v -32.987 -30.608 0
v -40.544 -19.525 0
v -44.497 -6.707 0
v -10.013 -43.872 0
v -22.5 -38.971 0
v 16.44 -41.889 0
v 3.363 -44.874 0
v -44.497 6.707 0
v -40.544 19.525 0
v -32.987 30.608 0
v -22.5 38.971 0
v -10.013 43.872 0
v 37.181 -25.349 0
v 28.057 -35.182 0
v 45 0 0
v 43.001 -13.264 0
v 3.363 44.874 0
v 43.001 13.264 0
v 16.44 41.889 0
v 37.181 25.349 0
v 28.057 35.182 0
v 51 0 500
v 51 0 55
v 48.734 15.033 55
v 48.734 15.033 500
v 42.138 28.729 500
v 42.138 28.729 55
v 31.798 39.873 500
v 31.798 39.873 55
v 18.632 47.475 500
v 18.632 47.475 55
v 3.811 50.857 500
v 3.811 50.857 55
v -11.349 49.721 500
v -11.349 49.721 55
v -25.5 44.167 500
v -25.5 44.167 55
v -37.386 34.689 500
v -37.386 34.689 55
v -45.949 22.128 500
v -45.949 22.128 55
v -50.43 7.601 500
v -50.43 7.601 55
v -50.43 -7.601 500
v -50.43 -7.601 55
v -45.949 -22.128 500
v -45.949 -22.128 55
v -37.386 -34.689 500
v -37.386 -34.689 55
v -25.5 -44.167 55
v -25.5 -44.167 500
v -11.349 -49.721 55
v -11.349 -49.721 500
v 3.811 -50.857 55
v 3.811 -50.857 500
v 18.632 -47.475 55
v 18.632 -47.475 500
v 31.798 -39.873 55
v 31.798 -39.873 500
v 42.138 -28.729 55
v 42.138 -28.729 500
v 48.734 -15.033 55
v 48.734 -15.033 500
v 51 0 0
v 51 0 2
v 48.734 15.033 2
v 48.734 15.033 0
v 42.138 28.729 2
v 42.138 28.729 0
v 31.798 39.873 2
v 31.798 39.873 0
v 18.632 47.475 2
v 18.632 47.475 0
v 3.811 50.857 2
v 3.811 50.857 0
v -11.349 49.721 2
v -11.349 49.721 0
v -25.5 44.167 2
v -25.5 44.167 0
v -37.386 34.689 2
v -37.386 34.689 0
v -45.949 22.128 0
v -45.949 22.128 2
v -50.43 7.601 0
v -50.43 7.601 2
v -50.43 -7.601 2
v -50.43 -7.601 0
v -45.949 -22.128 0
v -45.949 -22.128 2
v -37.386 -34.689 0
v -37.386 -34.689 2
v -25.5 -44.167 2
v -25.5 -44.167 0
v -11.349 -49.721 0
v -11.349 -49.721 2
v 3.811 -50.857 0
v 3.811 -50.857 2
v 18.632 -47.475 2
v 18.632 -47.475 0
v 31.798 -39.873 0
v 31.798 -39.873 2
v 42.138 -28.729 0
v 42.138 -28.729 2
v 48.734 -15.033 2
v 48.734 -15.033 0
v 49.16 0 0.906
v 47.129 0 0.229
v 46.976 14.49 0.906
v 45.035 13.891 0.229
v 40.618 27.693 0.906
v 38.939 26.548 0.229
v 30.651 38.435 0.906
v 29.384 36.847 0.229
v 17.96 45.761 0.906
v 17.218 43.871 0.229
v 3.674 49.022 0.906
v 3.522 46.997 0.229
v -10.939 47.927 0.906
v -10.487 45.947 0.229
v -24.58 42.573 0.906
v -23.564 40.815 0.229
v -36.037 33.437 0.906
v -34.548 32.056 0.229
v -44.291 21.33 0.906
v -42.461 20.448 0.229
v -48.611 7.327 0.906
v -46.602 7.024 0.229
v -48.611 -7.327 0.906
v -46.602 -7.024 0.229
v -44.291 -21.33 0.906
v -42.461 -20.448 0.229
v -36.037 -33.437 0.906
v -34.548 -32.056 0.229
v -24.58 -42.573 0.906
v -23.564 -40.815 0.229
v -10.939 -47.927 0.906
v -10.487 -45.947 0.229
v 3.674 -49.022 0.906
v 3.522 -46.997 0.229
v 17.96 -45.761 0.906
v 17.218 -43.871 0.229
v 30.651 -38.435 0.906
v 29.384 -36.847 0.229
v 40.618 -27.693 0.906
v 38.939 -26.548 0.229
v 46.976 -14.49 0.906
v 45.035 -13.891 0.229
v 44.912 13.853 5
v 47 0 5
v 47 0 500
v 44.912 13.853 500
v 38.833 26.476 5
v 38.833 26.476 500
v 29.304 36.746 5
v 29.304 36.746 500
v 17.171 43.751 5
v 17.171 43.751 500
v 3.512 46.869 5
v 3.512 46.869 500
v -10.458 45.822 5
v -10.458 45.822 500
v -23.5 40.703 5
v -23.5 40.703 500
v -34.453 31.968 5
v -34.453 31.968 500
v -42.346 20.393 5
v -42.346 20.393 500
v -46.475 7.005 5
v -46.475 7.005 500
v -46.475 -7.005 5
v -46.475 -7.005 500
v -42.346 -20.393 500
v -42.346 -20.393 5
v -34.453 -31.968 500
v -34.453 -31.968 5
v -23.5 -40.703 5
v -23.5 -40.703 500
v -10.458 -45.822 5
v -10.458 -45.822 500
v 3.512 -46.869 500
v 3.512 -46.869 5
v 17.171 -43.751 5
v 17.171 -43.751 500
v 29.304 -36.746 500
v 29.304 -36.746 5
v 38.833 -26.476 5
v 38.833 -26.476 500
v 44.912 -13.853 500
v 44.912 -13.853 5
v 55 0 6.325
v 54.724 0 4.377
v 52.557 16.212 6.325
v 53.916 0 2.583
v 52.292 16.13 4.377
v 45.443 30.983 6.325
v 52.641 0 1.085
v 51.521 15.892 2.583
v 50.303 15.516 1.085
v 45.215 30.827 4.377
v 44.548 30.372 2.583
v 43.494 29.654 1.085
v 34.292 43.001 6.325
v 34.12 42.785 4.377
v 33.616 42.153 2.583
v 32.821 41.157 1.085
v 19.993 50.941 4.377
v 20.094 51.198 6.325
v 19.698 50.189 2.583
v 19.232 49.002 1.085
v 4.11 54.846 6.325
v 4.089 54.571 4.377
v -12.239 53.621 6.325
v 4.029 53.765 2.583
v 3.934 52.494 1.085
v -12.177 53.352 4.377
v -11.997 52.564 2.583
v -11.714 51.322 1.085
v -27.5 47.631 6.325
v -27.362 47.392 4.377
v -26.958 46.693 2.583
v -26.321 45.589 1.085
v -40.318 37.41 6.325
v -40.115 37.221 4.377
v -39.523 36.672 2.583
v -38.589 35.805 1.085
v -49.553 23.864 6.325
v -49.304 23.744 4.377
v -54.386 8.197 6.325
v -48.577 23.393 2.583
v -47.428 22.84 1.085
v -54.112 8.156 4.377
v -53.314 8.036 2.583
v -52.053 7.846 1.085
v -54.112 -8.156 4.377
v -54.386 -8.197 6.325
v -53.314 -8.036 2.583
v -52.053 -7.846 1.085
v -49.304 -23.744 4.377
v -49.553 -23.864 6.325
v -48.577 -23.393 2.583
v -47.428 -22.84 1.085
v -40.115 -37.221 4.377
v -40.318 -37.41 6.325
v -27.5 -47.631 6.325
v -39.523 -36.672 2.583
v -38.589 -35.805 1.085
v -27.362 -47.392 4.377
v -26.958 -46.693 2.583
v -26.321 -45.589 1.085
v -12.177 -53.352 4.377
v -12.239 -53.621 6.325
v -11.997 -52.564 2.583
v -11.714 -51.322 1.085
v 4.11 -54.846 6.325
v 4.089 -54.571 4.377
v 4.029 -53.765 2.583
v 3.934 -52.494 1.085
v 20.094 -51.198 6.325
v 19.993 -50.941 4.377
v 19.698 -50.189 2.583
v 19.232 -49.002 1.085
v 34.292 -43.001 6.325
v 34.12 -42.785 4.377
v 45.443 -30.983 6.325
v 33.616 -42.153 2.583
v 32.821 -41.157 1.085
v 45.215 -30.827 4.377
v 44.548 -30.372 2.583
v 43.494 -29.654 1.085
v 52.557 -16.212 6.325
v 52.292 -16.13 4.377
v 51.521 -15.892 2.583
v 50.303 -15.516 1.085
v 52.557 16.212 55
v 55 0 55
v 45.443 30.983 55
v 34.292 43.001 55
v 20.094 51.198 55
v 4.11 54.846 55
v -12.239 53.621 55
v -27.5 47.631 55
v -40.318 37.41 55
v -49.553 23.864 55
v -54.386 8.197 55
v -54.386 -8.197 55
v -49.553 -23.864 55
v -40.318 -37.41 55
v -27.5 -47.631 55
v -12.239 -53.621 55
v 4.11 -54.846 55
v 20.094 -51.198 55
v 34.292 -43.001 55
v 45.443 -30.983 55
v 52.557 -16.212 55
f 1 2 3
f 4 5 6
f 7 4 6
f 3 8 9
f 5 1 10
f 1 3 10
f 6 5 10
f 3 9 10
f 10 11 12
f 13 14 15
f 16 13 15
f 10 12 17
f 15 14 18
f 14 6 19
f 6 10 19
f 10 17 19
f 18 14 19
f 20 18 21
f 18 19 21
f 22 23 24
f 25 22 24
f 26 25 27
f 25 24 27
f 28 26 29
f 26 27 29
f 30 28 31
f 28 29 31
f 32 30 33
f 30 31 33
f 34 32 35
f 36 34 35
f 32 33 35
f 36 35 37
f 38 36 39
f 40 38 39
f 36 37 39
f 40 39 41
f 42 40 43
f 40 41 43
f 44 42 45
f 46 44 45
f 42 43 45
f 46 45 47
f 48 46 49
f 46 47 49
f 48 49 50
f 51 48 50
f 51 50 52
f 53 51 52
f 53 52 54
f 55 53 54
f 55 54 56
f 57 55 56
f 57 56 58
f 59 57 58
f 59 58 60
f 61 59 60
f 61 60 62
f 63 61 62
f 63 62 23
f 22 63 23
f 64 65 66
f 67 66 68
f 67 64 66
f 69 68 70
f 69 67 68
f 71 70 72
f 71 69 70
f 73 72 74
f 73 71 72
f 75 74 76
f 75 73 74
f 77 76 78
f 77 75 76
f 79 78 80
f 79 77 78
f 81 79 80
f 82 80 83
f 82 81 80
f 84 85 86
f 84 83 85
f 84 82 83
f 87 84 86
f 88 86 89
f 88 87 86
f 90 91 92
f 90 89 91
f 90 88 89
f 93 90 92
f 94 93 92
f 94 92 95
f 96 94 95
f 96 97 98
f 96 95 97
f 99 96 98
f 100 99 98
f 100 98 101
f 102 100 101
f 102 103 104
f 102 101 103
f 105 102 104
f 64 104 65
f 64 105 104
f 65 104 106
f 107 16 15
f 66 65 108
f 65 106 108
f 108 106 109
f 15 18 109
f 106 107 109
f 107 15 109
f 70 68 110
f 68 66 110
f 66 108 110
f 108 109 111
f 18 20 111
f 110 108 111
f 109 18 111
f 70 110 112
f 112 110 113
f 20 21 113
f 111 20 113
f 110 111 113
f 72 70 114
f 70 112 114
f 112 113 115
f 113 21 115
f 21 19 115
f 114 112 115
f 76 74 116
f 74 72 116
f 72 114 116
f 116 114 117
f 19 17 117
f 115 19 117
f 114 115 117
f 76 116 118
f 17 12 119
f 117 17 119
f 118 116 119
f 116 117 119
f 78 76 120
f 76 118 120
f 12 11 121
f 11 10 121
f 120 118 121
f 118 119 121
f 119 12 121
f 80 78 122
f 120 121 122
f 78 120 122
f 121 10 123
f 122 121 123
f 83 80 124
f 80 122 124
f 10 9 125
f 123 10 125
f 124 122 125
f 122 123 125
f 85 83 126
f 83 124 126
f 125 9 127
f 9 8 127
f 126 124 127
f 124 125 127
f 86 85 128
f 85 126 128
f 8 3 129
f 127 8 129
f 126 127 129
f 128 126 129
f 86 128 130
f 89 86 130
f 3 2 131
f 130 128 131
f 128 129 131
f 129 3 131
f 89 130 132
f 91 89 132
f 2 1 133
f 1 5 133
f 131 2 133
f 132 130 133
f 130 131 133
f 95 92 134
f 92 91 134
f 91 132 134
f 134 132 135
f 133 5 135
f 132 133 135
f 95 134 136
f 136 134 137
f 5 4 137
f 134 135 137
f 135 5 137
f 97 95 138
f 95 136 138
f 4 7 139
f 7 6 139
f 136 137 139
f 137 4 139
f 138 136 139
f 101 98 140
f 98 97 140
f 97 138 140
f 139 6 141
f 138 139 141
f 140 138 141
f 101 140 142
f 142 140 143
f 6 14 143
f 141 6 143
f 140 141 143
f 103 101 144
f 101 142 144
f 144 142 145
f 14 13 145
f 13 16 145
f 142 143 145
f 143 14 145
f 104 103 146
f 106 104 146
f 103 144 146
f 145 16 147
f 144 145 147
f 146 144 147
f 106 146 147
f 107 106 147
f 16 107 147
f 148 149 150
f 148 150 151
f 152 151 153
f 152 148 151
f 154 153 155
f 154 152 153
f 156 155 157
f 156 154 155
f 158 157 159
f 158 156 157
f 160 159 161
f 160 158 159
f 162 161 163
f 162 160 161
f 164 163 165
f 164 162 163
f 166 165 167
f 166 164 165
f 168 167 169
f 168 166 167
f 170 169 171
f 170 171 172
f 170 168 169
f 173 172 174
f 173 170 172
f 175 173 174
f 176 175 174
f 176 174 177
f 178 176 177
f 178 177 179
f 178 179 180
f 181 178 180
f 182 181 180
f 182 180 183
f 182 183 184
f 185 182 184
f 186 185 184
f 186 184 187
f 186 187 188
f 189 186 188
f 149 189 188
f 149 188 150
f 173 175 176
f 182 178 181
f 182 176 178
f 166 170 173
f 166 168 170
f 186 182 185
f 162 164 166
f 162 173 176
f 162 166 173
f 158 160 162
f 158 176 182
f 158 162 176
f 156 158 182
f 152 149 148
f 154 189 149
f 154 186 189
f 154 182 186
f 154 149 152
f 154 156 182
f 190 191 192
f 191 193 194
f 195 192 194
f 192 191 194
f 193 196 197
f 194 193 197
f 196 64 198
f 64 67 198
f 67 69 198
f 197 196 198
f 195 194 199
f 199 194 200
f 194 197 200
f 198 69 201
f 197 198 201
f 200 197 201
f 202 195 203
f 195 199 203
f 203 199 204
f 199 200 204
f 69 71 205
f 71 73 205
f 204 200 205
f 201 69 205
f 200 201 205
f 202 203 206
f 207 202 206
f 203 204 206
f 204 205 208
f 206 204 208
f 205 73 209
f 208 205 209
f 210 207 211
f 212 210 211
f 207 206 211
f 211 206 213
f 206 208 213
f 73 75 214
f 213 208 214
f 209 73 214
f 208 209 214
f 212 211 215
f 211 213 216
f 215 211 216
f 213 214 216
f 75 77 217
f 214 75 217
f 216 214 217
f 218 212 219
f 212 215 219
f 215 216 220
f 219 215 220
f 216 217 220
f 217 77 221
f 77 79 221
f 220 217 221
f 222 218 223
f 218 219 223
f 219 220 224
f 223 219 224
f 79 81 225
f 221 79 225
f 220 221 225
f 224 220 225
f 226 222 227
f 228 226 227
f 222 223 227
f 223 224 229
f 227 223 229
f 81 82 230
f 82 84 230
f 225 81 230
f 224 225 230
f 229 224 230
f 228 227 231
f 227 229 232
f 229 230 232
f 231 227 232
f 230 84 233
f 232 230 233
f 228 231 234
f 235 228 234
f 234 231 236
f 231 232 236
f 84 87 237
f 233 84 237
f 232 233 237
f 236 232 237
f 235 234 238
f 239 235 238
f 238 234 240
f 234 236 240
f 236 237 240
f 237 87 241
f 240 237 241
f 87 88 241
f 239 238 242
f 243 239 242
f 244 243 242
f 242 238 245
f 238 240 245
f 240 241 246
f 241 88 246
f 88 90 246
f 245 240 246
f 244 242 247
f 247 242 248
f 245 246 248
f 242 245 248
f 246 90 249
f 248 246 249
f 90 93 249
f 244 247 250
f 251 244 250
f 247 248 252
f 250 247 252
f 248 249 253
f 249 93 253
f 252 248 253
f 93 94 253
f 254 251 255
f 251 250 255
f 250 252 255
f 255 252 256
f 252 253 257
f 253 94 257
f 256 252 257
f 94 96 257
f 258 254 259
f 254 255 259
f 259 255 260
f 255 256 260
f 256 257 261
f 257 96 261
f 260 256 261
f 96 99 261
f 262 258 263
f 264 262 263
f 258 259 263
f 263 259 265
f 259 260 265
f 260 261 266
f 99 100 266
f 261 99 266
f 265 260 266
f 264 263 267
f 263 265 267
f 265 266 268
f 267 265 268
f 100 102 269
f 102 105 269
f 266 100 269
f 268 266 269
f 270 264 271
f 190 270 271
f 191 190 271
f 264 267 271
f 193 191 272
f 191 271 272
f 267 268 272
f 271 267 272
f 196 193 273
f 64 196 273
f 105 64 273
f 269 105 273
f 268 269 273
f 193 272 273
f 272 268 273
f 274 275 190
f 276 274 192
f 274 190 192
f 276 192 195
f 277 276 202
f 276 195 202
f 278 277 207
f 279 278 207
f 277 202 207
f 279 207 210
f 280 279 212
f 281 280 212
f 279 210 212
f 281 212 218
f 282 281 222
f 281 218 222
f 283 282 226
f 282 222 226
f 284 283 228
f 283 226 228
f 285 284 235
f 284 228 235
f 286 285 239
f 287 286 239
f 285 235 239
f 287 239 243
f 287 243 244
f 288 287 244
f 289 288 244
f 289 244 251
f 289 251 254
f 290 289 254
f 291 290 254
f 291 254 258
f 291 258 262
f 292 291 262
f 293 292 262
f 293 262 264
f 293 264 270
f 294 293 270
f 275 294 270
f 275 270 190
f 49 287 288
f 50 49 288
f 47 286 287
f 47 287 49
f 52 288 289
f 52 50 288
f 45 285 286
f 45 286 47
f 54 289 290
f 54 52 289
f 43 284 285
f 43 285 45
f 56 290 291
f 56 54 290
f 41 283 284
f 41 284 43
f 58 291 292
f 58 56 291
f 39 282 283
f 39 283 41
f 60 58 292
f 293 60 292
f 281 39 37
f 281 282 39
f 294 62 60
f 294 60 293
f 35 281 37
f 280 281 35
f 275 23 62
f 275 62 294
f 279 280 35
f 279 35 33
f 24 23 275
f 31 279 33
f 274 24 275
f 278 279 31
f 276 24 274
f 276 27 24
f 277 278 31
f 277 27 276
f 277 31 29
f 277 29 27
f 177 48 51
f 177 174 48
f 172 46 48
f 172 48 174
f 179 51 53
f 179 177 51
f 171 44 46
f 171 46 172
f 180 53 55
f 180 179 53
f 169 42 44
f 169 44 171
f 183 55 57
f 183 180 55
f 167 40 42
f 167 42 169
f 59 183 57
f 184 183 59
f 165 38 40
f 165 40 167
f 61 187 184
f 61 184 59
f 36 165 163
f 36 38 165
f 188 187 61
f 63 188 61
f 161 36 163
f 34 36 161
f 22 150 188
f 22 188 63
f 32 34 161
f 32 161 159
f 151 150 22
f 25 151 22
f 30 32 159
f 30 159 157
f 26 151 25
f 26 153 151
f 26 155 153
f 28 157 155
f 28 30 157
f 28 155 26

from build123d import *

# Parameters (mm, degrees)
F0_R     = 55
F0_R_2   = 51
F0_R_3   = 47
F1_DEPTH = 5
F2_DEPTH = 500
F3_DEPTH = 50
F4_R     = 10
F5_DEPTH = 25
F6_DEPTH = 25
F7_DEPTH = 25


# Not quite as in the source:
# - a fillet or chamfer that OpenCascade refuses, or shapes differently, is made with other operations: its cross-section is extruded or revolved along the edge and cut away or added


with BuildPart() as f1:
    # F0 (on Top) → F1 (new body)
    with BuildSketch(Plane.XY):
        Circle(F0_R)
        Circle(F0_R_2, mode=Mode.SUBTRACT)
        Circle(F0_R_2)
        Circle(F0_R_3, mode=Mode.SUBTRACT)
        Circle(F0_R_3)
    extrude(amount=F1_DEPTH)

    # F0 (on Top) → F2 (join)
    with BuildSketch(Plane.XY):
        Circle(F0_R_2)
        Circle(F0_R_3, mode=Mode.SUBTRACT)
    extrude(amount=F2_DEPTH)

    # F3 (add): a face of the model
    f3_faces = [f1.faces().sort_by_distance(p)[0] for p in [
        (-53.4443650814, 0, 5),
    ]]
    extrude(f3_faces, amount=F3_DEPTH)

    # F4
    f4_edges = [f1.edges().sort_by_distance(p)[0] for p in [
        (-55, 0, 0),
    ]]
    fillet(f4_edges, radius=F4_R)

    # F0 (on Top) → F5 (join)
    with BuildSketch(Plane.XY):
        Circle(F0_R)
        Circle(F0_R_2, mode=Mode.SUBTRACT)
    extrude(amount=F5_DEPTH)

    # F0 (on Top) → F6 (join)
    with BuildSketch(Plane.XY):
        Circle(F0_R)
        Circle(F0_R_2, mode=Mode.SUBTRACT)
    extrude(amount=F6_DEPTH)

    # F0 (on Top) → F7 (join)
    with BuildSketch(Plane.XY):
        Circle(F0_R)
        Circle(F0_R_2, mode=Mode.SUBTRACT)
    extrude(amount=F7_DEPTH)

    # F8: fillet of radius 7 on 1 edges, made by hand

    # F8_s1 → F8_t2 (revolve, cut)
    with BuildSketch(Plane.XZ):
        with BuildLine():
            ThreePointArc((55, 6.3245553203), (53.9160797831, 2.5828979336), (51, 0))
            Line((51, 0), (55, 0))
            Line((55, 0), (55, 6.3245553203))
        make_face()
    revolve(axis=Axis((0, 0, 0), (0, 0, 1)), mode=Mode.SUBTRACT)


solid = f1.part
